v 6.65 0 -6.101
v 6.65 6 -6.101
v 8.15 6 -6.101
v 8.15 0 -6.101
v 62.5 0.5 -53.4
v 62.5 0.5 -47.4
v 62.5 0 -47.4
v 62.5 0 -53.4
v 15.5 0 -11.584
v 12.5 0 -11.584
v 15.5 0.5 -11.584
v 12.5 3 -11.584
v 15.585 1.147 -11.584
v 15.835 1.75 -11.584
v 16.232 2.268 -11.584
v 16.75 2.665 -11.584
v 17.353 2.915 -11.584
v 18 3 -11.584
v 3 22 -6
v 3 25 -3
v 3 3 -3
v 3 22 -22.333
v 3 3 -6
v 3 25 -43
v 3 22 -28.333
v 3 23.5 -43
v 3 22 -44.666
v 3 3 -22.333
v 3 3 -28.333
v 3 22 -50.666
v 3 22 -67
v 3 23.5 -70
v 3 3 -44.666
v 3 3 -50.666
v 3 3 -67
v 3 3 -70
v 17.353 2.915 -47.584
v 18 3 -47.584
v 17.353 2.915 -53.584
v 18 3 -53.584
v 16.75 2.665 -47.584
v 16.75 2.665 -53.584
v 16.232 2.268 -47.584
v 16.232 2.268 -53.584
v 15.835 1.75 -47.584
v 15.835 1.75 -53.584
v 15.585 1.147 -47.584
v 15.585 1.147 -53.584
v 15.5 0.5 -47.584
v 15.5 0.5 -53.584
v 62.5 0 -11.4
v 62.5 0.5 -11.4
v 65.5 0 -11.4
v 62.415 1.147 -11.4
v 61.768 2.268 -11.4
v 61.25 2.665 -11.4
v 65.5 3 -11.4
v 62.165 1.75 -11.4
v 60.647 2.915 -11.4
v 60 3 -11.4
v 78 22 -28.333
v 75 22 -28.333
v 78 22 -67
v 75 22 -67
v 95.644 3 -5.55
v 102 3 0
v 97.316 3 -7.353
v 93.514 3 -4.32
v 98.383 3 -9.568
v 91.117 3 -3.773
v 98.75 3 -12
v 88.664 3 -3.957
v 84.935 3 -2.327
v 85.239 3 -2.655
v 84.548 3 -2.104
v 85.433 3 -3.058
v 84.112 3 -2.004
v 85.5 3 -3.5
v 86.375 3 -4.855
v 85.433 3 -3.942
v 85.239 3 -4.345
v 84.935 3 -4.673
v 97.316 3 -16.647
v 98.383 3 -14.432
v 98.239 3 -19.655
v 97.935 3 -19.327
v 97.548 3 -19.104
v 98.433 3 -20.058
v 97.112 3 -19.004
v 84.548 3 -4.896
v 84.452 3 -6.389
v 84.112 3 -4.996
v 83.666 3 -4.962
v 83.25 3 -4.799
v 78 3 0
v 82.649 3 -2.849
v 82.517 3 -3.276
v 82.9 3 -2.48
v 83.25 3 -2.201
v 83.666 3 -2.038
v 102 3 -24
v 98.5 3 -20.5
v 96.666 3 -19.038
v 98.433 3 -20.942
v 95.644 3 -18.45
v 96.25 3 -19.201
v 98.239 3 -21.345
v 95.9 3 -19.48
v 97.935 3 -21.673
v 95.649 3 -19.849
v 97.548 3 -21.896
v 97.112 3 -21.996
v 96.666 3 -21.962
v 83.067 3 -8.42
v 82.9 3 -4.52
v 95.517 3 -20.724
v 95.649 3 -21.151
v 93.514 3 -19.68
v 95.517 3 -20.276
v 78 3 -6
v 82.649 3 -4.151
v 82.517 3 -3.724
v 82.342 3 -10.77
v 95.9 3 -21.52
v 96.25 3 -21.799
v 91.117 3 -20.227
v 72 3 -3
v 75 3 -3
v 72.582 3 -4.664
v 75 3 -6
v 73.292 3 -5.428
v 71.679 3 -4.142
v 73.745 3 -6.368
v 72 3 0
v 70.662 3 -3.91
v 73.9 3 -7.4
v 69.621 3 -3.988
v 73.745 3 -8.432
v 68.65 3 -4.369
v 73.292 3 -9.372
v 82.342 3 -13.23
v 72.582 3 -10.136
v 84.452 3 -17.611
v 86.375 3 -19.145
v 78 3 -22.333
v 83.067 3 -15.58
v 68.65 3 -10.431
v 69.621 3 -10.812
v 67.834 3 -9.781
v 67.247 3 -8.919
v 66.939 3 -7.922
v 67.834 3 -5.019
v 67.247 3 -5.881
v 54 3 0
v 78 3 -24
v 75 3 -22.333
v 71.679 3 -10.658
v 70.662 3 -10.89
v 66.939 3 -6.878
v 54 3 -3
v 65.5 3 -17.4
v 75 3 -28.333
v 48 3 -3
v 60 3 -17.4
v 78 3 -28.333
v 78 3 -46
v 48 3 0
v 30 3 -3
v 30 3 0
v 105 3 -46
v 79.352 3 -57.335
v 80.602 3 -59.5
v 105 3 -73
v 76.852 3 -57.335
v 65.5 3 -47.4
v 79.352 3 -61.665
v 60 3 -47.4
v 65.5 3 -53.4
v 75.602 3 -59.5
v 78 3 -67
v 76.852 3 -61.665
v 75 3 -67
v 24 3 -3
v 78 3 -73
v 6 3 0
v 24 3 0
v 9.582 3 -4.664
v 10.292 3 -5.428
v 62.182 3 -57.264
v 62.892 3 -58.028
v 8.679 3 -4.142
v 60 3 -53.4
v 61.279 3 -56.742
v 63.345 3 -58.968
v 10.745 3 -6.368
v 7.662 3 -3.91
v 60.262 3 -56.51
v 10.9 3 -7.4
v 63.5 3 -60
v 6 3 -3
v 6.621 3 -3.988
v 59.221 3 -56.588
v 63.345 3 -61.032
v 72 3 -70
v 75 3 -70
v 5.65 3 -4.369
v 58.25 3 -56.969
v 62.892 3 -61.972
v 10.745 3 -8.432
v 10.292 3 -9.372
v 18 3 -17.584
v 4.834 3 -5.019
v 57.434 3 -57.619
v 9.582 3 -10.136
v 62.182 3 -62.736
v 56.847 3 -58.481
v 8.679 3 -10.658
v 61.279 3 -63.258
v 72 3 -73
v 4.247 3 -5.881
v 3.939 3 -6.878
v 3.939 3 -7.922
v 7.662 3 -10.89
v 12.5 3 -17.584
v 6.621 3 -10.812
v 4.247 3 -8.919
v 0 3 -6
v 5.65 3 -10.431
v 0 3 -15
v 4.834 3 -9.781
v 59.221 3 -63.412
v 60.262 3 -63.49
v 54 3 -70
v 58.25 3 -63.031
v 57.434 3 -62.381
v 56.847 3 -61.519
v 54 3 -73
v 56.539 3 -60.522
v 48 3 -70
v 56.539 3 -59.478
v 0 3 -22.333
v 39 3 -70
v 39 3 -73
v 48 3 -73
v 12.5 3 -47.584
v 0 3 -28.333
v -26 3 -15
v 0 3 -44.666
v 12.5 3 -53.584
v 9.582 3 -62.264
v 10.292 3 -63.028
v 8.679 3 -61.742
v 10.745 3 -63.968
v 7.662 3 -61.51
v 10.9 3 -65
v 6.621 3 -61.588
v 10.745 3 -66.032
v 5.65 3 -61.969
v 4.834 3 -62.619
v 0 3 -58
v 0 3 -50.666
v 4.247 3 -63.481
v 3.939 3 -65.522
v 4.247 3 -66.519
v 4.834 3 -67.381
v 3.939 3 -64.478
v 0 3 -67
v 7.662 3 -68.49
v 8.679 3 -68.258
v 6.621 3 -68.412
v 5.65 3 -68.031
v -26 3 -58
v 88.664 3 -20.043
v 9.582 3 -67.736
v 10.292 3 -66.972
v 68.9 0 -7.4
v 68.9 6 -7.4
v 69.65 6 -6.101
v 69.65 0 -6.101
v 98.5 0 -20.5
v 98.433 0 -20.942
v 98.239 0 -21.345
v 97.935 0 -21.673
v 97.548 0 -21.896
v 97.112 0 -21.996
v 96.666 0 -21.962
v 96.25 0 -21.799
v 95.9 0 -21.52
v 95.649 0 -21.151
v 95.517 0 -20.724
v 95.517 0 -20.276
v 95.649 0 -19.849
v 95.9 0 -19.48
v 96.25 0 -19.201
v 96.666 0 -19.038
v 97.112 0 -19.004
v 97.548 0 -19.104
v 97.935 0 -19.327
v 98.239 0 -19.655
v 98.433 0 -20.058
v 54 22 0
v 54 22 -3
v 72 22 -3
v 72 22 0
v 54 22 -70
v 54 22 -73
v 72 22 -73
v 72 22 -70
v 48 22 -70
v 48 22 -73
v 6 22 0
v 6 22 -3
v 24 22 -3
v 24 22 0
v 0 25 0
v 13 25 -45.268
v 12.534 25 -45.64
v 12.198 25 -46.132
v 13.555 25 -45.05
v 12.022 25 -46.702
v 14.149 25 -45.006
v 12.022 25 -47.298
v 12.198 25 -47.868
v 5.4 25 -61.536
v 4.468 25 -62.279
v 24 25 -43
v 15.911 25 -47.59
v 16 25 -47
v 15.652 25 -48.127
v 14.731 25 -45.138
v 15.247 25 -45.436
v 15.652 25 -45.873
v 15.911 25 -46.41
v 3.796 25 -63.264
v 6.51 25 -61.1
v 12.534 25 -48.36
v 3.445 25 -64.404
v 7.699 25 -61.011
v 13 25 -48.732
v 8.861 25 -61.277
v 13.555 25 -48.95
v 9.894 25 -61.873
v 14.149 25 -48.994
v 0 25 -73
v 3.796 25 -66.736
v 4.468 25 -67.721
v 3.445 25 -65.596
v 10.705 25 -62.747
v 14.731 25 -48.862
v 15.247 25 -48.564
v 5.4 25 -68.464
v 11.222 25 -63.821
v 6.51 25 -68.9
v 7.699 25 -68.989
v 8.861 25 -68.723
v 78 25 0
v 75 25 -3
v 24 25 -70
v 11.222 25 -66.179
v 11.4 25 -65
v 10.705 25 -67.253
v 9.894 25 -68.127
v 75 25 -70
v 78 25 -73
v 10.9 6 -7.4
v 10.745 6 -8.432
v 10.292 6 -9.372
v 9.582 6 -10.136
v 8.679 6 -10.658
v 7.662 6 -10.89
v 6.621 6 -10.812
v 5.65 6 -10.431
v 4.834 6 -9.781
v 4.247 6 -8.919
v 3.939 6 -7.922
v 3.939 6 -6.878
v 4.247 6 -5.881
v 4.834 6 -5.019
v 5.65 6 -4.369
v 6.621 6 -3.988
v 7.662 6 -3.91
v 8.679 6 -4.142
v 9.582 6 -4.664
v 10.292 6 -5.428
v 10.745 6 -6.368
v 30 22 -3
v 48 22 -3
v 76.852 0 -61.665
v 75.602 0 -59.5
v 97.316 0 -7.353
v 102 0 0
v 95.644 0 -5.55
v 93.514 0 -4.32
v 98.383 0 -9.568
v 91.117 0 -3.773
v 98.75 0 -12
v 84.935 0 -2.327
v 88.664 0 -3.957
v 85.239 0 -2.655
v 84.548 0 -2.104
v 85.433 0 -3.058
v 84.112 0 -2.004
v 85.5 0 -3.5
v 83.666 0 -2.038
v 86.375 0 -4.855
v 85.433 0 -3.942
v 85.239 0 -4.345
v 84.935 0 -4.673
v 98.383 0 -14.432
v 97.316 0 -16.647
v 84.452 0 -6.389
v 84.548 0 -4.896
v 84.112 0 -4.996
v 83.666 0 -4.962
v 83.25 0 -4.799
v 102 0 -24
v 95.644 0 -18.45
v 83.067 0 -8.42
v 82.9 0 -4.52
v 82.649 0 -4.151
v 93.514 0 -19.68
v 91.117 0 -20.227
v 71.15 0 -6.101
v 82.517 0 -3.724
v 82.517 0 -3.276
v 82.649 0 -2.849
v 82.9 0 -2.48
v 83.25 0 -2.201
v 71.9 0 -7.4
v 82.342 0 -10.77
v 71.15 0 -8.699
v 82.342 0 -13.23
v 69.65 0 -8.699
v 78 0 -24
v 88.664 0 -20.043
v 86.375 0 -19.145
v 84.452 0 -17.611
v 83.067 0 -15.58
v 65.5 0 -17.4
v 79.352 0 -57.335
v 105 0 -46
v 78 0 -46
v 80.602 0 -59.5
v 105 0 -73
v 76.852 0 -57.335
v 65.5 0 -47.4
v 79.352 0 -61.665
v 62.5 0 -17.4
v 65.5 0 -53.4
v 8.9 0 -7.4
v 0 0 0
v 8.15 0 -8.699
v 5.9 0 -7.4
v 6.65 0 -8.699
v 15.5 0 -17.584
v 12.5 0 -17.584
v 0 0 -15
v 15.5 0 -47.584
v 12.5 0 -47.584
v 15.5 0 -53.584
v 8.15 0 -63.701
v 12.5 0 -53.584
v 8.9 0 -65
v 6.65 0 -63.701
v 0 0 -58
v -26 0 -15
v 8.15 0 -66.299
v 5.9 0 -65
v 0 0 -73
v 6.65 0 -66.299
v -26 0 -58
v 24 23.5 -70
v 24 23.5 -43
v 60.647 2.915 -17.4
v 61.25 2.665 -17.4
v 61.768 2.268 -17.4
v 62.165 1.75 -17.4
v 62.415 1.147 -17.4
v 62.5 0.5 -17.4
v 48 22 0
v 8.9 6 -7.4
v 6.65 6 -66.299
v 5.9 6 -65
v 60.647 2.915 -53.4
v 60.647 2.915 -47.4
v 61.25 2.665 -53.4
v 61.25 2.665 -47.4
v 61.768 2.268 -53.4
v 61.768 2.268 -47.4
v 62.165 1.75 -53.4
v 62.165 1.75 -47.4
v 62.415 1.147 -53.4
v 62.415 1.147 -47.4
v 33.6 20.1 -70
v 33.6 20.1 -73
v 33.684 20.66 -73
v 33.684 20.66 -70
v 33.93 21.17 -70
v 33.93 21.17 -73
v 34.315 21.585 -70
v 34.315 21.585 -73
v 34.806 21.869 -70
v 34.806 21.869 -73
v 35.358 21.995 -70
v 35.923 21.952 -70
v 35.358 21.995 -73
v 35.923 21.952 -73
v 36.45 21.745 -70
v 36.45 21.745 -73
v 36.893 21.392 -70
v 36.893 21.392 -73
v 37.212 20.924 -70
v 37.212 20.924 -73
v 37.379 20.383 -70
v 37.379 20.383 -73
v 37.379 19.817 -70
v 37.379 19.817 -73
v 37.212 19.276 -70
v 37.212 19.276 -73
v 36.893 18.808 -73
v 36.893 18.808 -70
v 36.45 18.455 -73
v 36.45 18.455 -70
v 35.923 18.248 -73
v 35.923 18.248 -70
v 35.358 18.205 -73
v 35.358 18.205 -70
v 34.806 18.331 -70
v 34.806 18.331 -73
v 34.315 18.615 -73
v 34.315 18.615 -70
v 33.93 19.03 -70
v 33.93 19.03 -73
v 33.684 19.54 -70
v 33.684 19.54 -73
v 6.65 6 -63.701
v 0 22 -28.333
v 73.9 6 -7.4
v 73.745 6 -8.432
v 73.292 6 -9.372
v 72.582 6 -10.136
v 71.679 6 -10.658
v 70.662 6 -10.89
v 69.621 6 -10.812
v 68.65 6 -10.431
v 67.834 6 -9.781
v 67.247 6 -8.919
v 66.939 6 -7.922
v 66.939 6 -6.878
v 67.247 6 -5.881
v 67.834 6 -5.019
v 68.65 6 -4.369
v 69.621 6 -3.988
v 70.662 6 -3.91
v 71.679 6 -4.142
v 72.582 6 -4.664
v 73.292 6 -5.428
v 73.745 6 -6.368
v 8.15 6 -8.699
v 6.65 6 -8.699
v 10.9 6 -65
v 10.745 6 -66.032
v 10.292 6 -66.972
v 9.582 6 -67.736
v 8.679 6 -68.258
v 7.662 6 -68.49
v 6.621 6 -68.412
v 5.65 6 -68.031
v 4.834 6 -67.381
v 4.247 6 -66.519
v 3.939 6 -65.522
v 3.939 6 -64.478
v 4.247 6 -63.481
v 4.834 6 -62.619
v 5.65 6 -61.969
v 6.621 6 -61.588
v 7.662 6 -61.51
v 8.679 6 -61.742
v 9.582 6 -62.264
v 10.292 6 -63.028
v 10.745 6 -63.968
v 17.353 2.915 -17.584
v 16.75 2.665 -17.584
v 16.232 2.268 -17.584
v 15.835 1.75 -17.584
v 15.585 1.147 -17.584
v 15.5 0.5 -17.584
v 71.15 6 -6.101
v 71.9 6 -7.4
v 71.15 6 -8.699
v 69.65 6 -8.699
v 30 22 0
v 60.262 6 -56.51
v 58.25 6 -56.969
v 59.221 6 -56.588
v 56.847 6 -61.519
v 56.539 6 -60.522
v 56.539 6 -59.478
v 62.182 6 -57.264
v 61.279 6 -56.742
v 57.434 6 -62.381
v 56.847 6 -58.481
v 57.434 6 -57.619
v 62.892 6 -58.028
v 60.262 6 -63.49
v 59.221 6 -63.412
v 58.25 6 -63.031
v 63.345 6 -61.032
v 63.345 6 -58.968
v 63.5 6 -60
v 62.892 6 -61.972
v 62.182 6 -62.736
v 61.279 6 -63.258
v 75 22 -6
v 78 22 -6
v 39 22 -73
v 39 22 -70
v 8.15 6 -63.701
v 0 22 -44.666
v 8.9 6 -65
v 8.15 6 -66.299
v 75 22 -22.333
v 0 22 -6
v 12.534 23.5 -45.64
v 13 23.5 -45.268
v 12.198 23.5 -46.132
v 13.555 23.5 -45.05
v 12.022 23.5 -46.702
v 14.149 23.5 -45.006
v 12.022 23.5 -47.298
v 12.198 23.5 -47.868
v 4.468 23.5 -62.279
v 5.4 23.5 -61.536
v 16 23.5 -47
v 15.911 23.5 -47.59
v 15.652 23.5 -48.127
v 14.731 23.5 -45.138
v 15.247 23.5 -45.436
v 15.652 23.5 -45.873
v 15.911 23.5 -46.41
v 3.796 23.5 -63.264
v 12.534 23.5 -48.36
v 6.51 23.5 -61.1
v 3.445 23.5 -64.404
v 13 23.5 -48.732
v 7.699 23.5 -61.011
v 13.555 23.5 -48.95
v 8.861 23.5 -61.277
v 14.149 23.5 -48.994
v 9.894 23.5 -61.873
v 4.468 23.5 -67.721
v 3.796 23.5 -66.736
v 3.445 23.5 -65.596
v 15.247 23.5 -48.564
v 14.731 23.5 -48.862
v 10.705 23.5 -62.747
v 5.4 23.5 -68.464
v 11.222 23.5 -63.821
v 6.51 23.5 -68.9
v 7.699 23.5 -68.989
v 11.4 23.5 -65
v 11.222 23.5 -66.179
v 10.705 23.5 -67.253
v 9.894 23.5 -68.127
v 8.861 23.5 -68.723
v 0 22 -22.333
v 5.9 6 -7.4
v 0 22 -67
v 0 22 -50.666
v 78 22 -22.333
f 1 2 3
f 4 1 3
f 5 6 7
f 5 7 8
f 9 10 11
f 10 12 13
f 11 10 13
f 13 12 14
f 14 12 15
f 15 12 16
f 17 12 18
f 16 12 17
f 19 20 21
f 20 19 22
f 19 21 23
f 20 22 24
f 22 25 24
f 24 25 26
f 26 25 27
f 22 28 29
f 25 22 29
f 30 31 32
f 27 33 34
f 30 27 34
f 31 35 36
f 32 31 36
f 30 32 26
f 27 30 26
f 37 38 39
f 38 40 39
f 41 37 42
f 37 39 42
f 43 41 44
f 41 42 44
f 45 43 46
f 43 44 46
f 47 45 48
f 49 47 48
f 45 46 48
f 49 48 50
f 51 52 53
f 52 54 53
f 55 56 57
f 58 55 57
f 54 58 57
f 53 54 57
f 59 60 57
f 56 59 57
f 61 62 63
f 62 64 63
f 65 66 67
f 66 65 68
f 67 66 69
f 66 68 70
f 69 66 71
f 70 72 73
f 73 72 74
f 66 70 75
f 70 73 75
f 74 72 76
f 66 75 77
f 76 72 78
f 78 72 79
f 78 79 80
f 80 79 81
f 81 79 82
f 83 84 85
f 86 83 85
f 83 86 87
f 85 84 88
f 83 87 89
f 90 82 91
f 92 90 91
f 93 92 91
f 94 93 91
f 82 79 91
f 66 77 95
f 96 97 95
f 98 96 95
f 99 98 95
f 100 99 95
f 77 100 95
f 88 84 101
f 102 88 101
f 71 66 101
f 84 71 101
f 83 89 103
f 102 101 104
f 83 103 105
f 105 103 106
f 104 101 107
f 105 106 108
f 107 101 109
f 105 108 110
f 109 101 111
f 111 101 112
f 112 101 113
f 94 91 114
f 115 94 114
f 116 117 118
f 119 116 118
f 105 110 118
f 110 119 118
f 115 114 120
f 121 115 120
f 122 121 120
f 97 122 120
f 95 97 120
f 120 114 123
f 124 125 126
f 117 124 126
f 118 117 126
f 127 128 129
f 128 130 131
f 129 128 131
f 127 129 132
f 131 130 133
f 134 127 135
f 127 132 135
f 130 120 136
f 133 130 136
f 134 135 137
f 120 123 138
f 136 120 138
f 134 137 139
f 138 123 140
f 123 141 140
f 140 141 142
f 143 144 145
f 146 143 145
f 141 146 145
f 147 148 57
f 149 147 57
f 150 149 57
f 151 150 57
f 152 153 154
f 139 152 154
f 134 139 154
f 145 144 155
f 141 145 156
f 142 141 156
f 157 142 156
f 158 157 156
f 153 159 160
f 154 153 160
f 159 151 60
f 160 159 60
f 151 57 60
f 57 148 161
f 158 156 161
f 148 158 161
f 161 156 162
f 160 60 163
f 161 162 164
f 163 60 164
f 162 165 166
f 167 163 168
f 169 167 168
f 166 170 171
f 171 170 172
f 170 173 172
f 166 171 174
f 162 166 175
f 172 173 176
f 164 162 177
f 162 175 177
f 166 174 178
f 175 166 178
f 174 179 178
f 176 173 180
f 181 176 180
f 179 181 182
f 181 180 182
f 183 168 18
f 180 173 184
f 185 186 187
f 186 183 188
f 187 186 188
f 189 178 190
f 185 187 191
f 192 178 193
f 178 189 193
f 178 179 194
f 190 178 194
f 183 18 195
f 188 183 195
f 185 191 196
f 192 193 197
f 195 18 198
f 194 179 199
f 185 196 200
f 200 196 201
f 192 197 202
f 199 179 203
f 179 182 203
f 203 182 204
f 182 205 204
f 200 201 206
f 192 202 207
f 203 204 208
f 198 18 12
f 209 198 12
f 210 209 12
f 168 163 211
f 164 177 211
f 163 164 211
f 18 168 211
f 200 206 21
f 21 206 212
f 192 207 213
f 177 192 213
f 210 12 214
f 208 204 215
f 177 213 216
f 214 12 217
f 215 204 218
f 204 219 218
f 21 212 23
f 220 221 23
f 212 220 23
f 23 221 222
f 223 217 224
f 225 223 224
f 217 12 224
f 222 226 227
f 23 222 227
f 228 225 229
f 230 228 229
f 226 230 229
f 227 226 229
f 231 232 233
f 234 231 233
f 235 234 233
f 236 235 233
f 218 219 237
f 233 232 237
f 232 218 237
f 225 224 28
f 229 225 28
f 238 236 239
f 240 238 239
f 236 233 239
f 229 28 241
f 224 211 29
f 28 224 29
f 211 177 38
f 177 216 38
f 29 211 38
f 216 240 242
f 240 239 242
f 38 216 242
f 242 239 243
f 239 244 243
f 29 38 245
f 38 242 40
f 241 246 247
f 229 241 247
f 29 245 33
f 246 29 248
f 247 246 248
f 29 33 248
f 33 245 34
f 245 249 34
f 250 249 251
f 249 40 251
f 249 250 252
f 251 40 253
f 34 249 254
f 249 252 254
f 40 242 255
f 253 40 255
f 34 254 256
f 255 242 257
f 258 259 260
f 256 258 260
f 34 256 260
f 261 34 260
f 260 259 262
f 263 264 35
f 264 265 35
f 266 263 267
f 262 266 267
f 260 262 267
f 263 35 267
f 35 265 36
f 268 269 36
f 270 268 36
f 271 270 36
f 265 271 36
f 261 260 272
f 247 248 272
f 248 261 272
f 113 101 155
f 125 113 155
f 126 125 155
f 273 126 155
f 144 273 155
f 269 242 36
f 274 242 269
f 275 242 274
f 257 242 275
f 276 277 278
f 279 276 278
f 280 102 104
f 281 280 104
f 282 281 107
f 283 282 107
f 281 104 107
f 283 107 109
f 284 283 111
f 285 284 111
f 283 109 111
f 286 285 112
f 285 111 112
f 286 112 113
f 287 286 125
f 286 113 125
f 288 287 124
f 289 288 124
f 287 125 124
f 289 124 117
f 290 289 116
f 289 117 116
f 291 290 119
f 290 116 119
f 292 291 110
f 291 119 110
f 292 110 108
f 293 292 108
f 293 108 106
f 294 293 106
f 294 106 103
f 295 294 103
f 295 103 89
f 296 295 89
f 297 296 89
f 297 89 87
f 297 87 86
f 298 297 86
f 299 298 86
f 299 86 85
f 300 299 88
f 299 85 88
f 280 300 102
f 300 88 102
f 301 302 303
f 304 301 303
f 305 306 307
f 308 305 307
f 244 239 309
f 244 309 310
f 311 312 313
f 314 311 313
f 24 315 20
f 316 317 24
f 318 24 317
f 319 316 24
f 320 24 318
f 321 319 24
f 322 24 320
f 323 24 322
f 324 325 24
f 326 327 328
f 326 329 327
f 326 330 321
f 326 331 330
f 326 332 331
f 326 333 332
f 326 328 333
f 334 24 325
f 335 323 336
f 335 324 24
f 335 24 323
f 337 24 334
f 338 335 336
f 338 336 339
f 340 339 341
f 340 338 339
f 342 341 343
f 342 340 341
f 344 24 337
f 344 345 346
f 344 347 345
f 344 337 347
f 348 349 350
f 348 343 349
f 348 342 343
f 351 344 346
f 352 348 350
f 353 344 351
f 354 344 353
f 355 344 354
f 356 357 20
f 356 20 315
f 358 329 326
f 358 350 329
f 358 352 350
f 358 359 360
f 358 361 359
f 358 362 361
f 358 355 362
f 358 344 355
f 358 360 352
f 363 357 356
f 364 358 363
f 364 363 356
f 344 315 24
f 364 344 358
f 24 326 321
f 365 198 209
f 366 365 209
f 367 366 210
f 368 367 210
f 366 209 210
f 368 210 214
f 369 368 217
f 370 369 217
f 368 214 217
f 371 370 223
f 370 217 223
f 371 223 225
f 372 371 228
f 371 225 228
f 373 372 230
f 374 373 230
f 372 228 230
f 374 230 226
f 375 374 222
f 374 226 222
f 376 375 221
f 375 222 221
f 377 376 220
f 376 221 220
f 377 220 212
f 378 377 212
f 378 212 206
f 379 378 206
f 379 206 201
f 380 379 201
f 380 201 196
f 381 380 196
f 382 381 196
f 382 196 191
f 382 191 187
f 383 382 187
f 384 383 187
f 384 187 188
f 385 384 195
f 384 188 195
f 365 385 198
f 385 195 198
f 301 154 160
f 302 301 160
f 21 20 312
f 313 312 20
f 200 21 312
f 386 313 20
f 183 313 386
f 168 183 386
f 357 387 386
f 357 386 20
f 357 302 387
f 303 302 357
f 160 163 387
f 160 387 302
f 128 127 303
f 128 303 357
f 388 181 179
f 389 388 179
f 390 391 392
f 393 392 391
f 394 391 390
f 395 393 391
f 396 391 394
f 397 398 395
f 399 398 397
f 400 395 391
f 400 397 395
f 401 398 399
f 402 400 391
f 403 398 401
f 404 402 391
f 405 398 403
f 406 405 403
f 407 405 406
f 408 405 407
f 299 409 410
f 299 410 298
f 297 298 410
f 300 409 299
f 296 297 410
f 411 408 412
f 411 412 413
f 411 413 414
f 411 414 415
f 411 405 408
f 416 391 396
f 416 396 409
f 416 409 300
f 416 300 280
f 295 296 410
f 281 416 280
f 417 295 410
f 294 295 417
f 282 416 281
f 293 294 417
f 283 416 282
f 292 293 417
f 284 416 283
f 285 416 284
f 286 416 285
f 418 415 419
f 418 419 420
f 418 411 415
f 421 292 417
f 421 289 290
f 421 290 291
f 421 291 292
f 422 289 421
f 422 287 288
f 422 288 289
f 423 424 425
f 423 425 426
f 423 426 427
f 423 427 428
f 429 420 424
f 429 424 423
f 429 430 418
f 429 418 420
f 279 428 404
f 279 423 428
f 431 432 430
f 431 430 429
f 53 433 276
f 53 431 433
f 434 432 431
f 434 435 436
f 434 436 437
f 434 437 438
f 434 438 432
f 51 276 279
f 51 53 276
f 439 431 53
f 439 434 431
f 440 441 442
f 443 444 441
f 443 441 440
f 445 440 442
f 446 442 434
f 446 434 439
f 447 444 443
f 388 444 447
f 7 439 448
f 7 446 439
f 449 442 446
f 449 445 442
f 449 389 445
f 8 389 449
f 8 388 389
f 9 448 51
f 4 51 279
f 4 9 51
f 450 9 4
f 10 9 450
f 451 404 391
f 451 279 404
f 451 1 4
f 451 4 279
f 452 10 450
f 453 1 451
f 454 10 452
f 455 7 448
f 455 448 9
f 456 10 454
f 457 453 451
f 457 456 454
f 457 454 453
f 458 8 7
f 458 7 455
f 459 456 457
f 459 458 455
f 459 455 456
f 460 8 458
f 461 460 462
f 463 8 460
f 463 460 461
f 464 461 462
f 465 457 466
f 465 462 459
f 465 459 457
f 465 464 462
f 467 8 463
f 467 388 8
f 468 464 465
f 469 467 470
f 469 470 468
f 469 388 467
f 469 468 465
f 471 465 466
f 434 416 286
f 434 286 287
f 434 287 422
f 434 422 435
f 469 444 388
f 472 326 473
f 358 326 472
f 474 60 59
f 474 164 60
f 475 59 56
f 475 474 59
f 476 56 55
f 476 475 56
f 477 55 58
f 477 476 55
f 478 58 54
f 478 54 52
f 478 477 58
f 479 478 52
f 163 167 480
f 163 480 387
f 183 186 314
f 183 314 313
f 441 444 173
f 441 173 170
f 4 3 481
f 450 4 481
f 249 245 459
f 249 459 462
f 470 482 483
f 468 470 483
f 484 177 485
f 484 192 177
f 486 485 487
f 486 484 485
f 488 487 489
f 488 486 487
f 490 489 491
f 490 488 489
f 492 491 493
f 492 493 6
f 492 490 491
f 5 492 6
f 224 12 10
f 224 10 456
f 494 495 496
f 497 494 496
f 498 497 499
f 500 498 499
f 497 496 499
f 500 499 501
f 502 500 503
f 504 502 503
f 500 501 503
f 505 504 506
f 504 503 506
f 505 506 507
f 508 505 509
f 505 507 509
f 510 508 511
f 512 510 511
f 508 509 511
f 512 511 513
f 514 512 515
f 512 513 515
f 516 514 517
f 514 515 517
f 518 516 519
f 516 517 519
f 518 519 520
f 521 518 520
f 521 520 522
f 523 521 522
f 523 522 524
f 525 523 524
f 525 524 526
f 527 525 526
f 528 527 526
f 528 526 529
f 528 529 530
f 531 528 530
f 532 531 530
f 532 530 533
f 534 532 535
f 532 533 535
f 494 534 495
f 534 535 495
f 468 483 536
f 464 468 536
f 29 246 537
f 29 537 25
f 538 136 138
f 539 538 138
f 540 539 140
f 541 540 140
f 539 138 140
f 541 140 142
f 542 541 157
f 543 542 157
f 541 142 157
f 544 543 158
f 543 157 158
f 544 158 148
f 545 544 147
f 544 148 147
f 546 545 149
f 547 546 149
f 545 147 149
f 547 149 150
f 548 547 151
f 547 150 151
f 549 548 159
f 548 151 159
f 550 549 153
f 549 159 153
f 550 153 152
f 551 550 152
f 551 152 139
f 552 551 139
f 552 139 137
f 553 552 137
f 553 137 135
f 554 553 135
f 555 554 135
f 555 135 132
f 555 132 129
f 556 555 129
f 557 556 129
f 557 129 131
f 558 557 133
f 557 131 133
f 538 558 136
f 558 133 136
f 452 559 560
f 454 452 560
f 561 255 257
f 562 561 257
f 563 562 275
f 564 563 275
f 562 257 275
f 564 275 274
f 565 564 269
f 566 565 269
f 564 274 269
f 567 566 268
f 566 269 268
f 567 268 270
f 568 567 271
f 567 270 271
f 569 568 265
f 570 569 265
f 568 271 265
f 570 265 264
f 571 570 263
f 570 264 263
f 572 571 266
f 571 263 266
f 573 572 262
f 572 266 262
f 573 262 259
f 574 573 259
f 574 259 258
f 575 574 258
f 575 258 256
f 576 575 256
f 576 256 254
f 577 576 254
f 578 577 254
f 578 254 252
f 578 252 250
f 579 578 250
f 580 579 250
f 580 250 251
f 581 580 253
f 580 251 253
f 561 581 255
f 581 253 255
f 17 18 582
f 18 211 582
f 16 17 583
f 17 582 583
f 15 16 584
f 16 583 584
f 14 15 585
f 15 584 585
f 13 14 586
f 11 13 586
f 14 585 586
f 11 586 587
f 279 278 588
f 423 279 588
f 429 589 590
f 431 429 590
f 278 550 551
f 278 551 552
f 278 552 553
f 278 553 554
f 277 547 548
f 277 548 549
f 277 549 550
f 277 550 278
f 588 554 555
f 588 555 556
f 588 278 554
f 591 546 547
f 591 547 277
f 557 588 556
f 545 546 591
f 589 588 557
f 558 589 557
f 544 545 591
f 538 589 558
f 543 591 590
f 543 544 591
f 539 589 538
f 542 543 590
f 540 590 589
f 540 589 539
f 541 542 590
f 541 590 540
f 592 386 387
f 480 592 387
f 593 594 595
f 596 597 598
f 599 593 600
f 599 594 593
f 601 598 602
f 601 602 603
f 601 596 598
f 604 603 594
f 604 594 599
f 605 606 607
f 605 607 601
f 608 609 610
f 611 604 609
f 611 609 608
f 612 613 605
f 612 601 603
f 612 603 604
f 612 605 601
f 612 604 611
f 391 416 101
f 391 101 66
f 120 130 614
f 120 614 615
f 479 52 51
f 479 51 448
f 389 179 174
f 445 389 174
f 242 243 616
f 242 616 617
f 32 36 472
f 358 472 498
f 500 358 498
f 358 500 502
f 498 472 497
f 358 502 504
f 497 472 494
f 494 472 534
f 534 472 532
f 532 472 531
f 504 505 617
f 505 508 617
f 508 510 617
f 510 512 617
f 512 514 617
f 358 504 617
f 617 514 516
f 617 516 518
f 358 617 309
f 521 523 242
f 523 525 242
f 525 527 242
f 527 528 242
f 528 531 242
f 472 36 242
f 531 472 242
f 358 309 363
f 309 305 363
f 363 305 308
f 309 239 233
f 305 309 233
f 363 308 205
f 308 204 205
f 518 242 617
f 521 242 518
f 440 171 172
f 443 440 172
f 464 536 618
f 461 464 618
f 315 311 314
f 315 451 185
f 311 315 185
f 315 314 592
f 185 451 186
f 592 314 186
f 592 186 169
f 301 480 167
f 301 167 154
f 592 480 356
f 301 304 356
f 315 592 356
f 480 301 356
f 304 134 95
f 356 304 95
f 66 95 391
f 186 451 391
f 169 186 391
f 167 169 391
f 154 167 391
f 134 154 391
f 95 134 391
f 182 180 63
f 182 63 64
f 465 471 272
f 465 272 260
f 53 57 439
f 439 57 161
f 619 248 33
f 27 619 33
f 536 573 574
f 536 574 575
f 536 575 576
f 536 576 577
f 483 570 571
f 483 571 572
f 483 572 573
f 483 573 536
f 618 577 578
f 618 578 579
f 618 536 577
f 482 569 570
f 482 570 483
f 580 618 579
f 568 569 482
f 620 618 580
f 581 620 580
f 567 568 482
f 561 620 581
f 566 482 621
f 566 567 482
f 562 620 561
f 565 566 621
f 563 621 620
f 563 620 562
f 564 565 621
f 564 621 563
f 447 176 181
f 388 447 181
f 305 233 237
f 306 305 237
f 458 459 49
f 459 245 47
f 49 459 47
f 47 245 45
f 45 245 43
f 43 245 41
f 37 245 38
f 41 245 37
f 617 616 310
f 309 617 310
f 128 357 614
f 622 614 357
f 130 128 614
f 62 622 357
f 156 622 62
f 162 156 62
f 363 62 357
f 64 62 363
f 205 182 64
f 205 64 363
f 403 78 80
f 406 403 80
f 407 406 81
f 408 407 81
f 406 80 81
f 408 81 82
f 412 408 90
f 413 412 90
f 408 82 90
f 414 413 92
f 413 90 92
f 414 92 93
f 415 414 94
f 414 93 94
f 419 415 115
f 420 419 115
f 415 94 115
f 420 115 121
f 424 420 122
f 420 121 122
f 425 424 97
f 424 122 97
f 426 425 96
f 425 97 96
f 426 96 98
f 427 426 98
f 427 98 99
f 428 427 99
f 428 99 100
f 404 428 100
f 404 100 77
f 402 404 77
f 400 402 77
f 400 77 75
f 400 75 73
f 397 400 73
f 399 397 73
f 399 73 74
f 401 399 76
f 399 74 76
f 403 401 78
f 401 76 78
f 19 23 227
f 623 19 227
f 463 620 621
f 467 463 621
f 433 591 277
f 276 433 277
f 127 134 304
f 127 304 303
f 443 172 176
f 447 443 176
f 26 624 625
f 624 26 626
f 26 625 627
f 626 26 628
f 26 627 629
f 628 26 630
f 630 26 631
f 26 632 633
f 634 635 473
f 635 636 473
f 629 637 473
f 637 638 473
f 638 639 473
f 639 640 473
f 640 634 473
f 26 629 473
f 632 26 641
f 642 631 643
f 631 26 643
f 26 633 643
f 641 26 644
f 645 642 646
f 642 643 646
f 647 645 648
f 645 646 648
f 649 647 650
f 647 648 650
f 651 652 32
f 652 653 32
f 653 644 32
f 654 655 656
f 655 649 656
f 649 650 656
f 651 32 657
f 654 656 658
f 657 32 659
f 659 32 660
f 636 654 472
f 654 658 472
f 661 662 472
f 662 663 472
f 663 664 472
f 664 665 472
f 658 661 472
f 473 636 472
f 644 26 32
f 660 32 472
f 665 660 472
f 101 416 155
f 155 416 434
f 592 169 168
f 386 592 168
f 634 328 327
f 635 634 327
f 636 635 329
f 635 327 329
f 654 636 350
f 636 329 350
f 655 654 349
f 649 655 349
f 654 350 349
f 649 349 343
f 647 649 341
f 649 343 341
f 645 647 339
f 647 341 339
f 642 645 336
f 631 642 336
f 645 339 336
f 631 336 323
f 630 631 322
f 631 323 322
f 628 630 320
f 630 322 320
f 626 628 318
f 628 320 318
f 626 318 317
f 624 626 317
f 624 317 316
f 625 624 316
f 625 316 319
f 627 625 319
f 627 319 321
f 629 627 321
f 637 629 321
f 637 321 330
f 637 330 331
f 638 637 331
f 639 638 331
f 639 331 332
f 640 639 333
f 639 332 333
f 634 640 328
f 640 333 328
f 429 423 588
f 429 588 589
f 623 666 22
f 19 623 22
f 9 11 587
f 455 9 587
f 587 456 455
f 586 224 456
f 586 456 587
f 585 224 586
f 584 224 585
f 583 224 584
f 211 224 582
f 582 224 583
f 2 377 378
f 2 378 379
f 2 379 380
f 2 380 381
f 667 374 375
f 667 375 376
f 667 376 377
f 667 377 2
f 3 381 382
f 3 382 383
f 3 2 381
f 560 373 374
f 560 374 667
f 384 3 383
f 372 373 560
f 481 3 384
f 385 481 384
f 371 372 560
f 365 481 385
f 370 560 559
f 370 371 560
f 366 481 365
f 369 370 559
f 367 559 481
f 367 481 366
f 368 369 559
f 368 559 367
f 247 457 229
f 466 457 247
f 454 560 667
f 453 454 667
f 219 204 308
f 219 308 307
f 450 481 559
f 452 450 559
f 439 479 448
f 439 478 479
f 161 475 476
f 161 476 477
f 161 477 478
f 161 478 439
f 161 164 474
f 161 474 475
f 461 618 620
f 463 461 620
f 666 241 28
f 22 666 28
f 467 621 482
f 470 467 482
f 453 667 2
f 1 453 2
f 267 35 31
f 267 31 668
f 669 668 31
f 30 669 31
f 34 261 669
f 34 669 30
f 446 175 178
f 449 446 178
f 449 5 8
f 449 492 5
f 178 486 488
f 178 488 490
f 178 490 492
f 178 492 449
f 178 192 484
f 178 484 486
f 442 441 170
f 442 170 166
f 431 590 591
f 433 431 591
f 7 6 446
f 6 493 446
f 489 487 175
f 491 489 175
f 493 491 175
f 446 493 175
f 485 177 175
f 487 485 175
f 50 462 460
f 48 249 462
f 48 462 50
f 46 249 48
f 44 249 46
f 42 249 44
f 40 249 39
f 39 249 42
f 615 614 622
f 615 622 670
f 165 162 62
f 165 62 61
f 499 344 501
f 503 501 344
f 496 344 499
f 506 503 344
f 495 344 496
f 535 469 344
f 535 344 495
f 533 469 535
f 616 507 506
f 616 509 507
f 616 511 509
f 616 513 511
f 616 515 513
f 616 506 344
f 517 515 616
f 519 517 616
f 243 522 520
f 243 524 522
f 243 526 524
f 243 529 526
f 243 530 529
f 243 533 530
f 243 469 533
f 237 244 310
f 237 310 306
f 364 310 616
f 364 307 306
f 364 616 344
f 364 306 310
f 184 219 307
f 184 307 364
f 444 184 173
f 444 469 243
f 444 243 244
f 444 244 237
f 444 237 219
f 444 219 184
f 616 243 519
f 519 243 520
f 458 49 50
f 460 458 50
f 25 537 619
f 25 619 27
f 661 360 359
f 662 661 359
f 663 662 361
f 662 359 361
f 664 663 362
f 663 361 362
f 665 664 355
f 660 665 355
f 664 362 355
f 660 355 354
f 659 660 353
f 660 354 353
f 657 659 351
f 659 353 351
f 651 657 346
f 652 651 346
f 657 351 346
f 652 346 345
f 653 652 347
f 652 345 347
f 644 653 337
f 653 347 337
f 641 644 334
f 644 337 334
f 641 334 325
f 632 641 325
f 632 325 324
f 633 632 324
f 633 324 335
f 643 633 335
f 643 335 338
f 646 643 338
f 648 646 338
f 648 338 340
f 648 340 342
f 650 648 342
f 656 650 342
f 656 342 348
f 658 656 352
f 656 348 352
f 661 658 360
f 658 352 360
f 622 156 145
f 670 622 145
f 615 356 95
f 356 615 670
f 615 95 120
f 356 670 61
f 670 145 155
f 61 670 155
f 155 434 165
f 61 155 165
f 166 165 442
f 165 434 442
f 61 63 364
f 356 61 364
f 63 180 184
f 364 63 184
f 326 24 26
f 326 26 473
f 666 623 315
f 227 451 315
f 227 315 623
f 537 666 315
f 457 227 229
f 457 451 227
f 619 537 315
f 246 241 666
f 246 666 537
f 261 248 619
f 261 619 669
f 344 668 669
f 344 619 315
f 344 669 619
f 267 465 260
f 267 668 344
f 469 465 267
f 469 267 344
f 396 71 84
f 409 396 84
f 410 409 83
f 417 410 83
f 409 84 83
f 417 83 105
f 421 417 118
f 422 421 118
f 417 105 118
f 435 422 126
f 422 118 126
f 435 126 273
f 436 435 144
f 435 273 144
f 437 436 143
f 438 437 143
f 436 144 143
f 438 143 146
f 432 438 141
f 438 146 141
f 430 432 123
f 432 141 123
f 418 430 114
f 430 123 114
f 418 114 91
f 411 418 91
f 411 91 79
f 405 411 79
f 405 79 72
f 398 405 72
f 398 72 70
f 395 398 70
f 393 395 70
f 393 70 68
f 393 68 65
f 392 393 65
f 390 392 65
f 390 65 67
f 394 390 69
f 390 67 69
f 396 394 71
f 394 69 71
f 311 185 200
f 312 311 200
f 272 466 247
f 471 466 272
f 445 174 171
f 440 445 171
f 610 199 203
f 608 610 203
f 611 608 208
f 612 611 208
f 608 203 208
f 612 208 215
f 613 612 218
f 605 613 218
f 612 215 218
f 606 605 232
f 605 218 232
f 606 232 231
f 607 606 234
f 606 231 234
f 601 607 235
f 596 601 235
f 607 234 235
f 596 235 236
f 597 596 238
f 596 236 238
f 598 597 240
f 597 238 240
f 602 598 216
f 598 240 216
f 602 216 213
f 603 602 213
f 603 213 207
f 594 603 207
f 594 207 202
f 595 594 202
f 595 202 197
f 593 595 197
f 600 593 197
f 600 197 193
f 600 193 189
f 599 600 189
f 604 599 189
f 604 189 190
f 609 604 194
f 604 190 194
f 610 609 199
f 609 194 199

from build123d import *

# Parameters (mm, degrees)
BOSS_EXTRUDE1_DEPTH = 3
SKETCH2_W           = 3
SKETCH2_H           = 6
SKETCH2_W_2         = 6
SKETCH2_H_2         = 3
BOSS_EXTRUDE2_DEPTH = 19
SKETCH3_W           = 78
SKETCH3_H           = 73
SKETCH3_W_2         = 72
SKETCH3_H_2         = 67
BOSS_EXTRUDE3_DEPTH = 3
SKETCH4_R           = 3.5
BOSS_EXTRUDE4_DEPTH = 3
CUT_EXTRUDE1_DEPTH  = 130.761319352
CUT_EXTRUDE2_DEPTH  = 3
SKETCH7_R           = 1.9
CUT_EXTRUDE3_DEPTH  = 3
SKETCH8_W           = 21
SKETCH8_H           = 27
SKETCH8_R           = 2
SKETCH8_R_2         = 4
BOSS_EXTRUDE5_DEPTH = 1.5
SKETCH9_R           = 1.5
SKETCH9_R_2         = 8.25
CUT_EXTRUDE4_DEPTH  = 3
SKETCH10_W          = 3
SKETCH10_H          = 6
CUT_EXTRUDE5_DEPTH  = 3
FILLET1_R           = 2.5


with BuildPart() as part:
    # Sketch1 → Boss-Extrude1 (new body)
    with BuildSketch(Plane(origin=(0, 0, 0), x_dir=(1, 0, 0), z_dir=(0, 1, 0))):
        Polygon((100, 24), (102, 24), (102, 0), (100, 0), (78, 0), (0, 0), (0, 15), (-26, 15), (-26, 58), (0, 58), (0, 73), (78, 73), (105, 73), (105, 46), (78, 46), (78, 24), align=None)
    extrude(amount=BOSS_EXTRUDE1_DEPTH)

    # Sketch2 → Boss-Extrude2 (add)
    with BuildSketch(Plane(origin=(0, 3, 0), x_dir=(1, 0, 0), z_dir=(0, 1, 0))):
        Polygon((0, 0), (3, 0), (6, 0), (6, 3), (3, 3), (3, 6), (0, 6), align=None)
        Polygon((78, 0), (75, 0), (72, 0), (72, 3), (75, 3), (75, 6), (78, 6), align=None)
        with Locations((1.5, 25.3333)):
            Rectangle(SKETCH2_W, SKETCH2_H)
        with Locations((1.5, 47.6663)):
            Rectangle(SKETCH2_W, SKETCH2_H)
        Polygon((0, 73), (3, 73), (6, 73), (36, 73), (39, 73), (39, 70), (36, 70), (17, 70), (3, 70), (3, 67), (0, 67), align=None)
        with Locations((27, 1.5)):
            Rectangle(SKETCH2_W_2, SKETCH2_H_2)
        with Locations((51, 1.5)):
            Rectangle(SKETCH2_W_2, SKETCH2_H_2)
        with Locations((76.5, 25.333)):
            Rectangle(SKETCH2_W, SKETCH2_H)
        Polygon((72, 73), (78, 73), (78, 70), (78, 67), (75, 67), (75, 70), (72, 70), align=None)
        with Locations((51, 71.5)):
            Rectangle(SKETCH2_W_2, SKETCH2_H_2)
    extrude(amount=BOSS_EXTRUDE2_DEPTH)

    # Sketch3 → Boss-Extrude3 (add)
    with BuildSketch(Plane(origin=(0, 22, 0), x_dir=(1, 0, 0), z_dir=(0, 1, 0))):
        with Locations((39, 36.5)):
            Rectangle(SKETCH3_W, SKETCH3_H)
        with Locations((39, 36.5)):
            Rectangle(SKETCH3_W_2, SKETCH3_H_2, mode=Mode.SUBTRACT)
    extrude(amount=BOSS_EXTRUDE3_DEPTH)

    # Sketch4 → Boss-Extrude4 (add)
    # profile 1 of 4: a face of its own
    with BuildSketch(Plane(origin=(0, 3, 0), x_dir=(1, 0, 0), z_dir=(0, 1, 0))):
        with Locations((7.4, 65)):
            Circle(SKETCH4_R)
        Polygon((8.9, 65), (8.15, 66.299038106), (6.65, 66.299038106), (5.9, 65), (6.65, 63.700961894), (8.15, 63.700961894), align=None, mode=Mode.SUBTRACT)
    # profile 2 of 4: a face of its own
    with BuildSketch(Plane(origin=(0, 3, 0), x_dir=(1, 0, 0), z_dir=(0, 1, 0))):
        with Locations((7.4, 7.4)):
            Circle(SKETCH4_R)
        Polygon((8.9, 7.4), (8.15, 8.699038106), (6.65, 8.699038106), (5.9, 7.4), (6.65, 6.100961894), (8.15, 6.100961894), align=None, mode=Mode.SUBTRACT)
    # profile 3 of 4: a face of its own
    with BuildSketch(Plane(origin=(0, 3, 0), x_dir=(1, 0, 0), z_dir=(0, 1, 0))):
        with Locations((70.4, 7.4)):
            Circle(SKETCH4_R)
        Polygon((68.9, 7.4), (69.65, 6.100961894), (71.15, 6.100961894), (71.9, 7.4), (71.15, 8.699038106), (69.65, 8.699038106), align=None, mode=Mode.SUBTRACT)
    # profile 4 of 4: a face of its own
    with BuildSketch(Plane(origin=(0, 3, 0), x_dir=(1, 0, 0), z_dir=(0, 1, 0))):
        with Locations((60, 60)):
            Circle(SKETCH4_R)
    extrude(amount=BOSS_EXTRUDE4_DEPTH)

    # Sketch4<2> → Cut-Extrude1 (cut, through all)
    with BuildSketch(Plane(origin=(0, 3, 0), x_dir=(1, 0, 0), z_dir=(0, 1, 0))):
        Polygon((8.15, 63.700961894), (8.9, 65), (8.15, 66.299038106), (6.65, 66.299038106), (5.9, 65), (6.65, 63.700961894), align=None)
        Polygon((8.15, 6.100961894), (8.9, 7.4), (8.15, 8.699038106), (6.65, 8.699038106), (5.9, 7.4), (6.65, 6.100961894), align=None)
        Polygon((69.65, 8.699038106), (68.9, 7.4), (69.65, 6.100961894), (71.15, 6.100961894), (71.9, 7.4), (71.15, 8.699038106), align=None)
    extrude(amount=-CUT_EXTRUDE1_DEPTH, mode=Mode.SUBTRACT)

    # Sketch5 → Cut-Extrude2 (cut)
    with BuildSketch(Plane(origin=(0, 3, 0), x_dir=(1, 0, 0), z_dir=(0, 1, 0))):
        Polygon((80.601762475, 59.5), (79.351762475, 61.665063509), (76.851762475, 61.665063509), (75.601762475, 59.5), (76.851762475, 57.334936491), (79.351762475, 57.334936491), align=None)
    extrude(amount=-CUT_EXTRUDE2_DEPTH, mode=Mode.SUBTRACT)

    # Sketch7 → Cut-Extrude3 (cut)
    with BuildSketch(Plane(origin=(0, 0, -73), x_dir=(-1, 0, 0), z_dir=(0, 0, -1))):
        with Locations((-35.5, 20.1)):
            Circle(SKETCH7_R)
    extrude(amount=-CUT_EXTRUDE3_DEPTH, mode=Mode.SUBTRACT)

    # Sketch8 → Boss-Extrude5 (add)
    with BuildSketch(Plane(origin=(0, 25, 0), x_dir=(1, 0, 0), z_dir=(0, 1, 0))):
        with Locations((13.5, 56.5)):
            Rectangle(SKETCH8_W, SKETCH8_H)
        with Locations((14, 47)):
            Circle(SKETCH8_R, mode=Mode.SUBTRACT)
        with Locations((7.4, 65)):
            Circle(SKETCH8_R_2, mode=Mode.SUBTRACT)
    extrude(amount=-BOSS_EXTRUDE5_DEPTH)

    # Sketch9 → Cut-Extrude4 (cut)
    with BuildSketch(Plane(origin=(0, 3, 0), x_dir=(1, 0, 0), z_dir=(0, 1, 0))):
        with Locations((97, 20.5)):
            Circle(SKETCH9_R)
        with Locations((84, 3.5)):
            Circle(SKETCH9_R)
        with Locations((90.5, 12)):
            Circle(SKETCH9_R_2)
    extrude(amount=-CUT_EXTRUDE4_DEPTH, mode=Mode.SUBTRACT)

    # Sketch10 → Cut-Extrude5 (cut)
    with BuildSketch(Plane(origin=(0, 3, 0), x_dir=(1, 0, 0), z_dir=(0, 1, 0))):
        with Locations((64, 14.4)):
            Rectangle(SKETCH10_W, SKETCH10_H)
        with Locations((64, 50.4)):
            Rectangle(SKETCH10_W, SKETCH10_H)
        with Locations((14, 14.584176744)):
            Rectangle(SKETCH10_W, SKETCH10_H)
        with Locations((14, 50.584176744)):
            Rectangle(SKETCH10_W, SKETCH10_H)
    extrude(amount=-CUT_EXTRUDE5_DEPTH, mode=Mode.SUBTRACT)

    # Fillet1
    fillet1_edges = [part.edges().sort_by_distance(p)[0] for p in [
        (15.5, 3, -50.584176744),
        (62.5, 3, -50.4),
        (62.5, 3, -14.4),
        (15.5, 3, -14.584176744),
    ]]
    fillet(fillet1_edges, radius=FILLET1_R)


solid = part.part
